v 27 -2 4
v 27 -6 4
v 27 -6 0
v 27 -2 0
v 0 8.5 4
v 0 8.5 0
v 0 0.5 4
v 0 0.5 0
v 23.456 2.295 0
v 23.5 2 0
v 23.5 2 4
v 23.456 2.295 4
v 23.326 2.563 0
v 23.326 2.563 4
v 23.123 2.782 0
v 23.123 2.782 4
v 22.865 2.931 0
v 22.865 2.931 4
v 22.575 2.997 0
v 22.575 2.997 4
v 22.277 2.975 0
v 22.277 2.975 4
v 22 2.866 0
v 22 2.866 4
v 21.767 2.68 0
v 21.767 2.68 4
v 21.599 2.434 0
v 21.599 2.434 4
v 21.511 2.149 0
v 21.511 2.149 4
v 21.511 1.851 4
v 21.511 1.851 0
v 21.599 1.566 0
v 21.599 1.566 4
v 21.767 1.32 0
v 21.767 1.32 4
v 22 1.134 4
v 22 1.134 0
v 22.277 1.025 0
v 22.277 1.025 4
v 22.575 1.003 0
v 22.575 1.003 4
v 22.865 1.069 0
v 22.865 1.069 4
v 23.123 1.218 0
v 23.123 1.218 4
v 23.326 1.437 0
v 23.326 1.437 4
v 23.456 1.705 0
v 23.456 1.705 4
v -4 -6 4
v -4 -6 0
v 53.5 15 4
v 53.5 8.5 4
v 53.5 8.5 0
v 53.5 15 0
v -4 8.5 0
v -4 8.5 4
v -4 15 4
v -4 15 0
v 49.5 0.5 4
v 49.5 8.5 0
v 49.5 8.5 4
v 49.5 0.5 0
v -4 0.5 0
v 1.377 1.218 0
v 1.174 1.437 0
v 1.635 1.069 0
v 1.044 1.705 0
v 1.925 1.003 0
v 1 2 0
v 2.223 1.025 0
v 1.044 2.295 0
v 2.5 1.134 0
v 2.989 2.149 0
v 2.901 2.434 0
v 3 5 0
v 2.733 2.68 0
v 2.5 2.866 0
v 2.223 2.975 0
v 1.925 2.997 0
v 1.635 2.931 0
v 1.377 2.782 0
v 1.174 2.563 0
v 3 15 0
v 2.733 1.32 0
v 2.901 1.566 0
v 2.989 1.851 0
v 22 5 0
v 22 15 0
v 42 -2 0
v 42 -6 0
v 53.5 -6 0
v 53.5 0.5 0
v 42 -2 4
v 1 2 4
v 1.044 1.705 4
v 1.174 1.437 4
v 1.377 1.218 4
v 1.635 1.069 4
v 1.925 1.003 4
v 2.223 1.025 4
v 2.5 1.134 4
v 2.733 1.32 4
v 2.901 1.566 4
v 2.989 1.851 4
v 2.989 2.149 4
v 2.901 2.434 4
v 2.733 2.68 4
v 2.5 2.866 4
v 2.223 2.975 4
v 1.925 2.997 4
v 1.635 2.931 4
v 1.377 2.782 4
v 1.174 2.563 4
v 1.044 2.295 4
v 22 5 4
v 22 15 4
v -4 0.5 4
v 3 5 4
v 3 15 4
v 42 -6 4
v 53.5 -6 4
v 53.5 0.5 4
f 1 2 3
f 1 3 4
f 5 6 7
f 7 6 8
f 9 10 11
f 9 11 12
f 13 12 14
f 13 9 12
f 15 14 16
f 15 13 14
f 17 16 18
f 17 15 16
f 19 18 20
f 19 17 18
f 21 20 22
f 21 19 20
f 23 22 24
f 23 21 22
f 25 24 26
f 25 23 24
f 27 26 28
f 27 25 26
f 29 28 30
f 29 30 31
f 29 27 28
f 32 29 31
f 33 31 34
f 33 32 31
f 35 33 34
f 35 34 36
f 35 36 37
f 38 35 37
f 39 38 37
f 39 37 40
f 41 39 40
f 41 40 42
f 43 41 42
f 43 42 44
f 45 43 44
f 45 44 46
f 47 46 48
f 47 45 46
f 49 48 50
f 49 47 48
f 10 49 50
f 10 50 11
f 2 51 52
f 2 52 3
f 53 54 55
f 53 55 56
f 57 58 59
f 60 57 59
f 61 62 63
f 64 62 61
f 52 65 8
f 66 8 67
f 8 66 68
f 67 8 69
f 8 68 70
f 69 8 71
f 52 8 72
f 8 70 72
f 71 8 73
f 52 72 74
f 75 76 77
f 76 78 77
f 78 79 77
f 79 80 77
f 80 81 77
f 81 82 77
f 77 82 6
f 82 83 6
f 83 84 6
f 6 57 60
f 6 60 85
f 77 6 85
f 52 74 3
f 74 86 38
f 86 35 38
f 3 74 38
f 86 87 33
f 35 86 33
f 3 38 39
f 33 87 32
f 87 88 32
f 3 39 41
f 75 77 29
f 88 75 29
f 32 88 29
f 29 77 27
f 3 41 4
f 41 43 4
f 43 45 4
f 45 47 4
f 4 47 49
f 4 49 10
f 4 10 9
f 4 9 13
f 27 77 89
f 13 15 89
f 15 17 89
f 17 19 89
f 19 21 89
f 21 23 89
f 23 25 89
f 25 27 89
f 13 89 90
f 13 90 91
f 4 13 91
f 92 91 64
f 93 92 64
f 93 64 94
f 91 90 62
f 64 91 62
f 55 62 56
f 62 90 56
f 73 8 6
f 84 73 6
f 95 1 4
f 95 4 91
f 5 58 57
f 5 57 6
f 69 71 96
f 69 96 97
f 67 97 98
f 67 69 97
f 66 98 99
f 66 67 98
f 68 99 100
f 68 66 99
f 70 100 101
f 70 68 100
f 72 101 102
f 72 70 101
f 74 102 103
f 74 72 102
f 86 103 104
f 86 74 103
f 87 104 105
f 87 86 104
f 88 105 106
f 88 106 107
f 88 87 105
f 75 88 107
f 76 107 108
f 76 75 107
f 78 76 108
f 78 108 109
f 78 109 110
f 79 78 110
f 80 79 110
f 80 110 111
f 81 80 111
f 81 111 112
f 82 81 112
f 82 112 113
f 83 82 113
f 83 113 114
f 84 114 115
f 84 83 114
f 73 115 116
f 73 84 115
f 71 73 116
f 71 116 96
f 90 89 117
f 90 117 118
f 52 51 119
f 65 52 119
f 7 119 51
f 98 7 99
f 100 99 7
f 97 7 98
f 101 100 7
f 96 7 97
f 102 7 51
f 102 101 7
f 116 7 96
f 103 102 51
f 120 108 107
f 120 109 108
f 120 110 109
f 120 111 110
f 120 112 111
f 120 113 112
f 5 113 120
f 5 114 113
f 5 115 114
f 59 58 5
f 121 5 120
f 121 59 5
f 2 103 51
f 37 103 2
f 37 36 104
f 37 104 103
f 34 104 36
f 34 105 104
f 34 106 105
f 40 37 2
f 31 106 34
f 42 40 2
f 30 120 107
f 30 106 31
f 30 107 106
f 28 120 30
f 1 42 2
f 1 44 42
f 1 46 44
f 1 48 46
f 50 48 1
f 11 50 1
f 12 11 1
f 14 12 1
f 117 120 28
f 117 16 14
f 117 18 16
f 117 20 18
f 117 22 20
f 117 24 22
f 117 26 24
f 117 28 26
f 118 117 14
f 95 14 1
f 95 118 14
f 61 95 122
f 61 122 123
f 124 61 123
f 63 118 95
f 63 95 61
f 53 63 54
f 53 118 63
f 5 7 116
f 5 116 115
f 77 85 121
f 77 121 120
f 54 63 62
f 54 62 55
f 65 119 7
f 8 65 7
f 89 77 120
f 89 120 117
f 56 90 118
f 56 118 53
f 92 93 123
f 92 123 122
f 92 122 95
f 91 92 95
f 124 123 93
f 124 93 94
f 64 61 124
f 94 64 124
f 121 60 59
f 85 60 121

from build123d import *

# Parameters (mm, degrees)
SKETCH_1_R          = 1
EXTRUDE_1_DEPTH     = 4
SKETCH_2_W          = 15
SKETCH_2_H          = 4
CUT_EXTRUDE_1_DEPTH = 10
SKETCH_3_W          = 4
SKETCH_3_H          = 6.5
EXTRUDE_2_DEPTH     = 4


with BuildPart() as part:
    # Эскиз1 → Бобышка-Вытянуть1 (new body)
    with BuildSketch(Plane.XY):
        Polygon((0, 0), (0, 15), (3, 15), (3, 5), (22, 5), (22, 15), (49.5, 15), (49.5, -6), (0, -6), align=None)
        with Locations((22.5, 2)):
            Circle(SKETCH_1_R, mode=Mode.SUBTRACT)
        with Locations(Location((2, 2, 0), (0, 0, 180))):
            Circle(SKETCH_1_R, mode=Mode.SUBTRACT)
    extrude(amount=EXTRUDE_1_DEPTH)

    # Эскиз2 → Вырез-Вытянуть1 (cut)
    with BuildSketch(Plane.XY.offset(4)):
        with Locations((34.5, -4)):
            Rectangle(SKETCH_2_W, SKETCH_2_H)
    extrude(amount=-CUT_EXTRUDE_1_DEPTH, mode=Mode.SUBTRACT)

    # Эскиз3 → Бобышка-Вытянуть2 (add)
    with BuildSketch(Plane.XY.offset(4)):
        with Locations((-2, -2.75)):
            Rectangle(SKETCH_3_W, SKETCH_3_H)
        with Locations((-2, 11.75)):
            Rectangle(SKETCH_3_W, SKETCH_3_H)
        with Locations((51.5, 11.75)):
            Rectangle(SKETCH_3_W, SKETCH_3_H)
        with Locations((51.5, -2.75)):
            Rectangle(SKETCH_3_W, SKETCH_3_H)
    extrude(amount=-EXTRUDE_2_DEPTH)


solid = part.part
